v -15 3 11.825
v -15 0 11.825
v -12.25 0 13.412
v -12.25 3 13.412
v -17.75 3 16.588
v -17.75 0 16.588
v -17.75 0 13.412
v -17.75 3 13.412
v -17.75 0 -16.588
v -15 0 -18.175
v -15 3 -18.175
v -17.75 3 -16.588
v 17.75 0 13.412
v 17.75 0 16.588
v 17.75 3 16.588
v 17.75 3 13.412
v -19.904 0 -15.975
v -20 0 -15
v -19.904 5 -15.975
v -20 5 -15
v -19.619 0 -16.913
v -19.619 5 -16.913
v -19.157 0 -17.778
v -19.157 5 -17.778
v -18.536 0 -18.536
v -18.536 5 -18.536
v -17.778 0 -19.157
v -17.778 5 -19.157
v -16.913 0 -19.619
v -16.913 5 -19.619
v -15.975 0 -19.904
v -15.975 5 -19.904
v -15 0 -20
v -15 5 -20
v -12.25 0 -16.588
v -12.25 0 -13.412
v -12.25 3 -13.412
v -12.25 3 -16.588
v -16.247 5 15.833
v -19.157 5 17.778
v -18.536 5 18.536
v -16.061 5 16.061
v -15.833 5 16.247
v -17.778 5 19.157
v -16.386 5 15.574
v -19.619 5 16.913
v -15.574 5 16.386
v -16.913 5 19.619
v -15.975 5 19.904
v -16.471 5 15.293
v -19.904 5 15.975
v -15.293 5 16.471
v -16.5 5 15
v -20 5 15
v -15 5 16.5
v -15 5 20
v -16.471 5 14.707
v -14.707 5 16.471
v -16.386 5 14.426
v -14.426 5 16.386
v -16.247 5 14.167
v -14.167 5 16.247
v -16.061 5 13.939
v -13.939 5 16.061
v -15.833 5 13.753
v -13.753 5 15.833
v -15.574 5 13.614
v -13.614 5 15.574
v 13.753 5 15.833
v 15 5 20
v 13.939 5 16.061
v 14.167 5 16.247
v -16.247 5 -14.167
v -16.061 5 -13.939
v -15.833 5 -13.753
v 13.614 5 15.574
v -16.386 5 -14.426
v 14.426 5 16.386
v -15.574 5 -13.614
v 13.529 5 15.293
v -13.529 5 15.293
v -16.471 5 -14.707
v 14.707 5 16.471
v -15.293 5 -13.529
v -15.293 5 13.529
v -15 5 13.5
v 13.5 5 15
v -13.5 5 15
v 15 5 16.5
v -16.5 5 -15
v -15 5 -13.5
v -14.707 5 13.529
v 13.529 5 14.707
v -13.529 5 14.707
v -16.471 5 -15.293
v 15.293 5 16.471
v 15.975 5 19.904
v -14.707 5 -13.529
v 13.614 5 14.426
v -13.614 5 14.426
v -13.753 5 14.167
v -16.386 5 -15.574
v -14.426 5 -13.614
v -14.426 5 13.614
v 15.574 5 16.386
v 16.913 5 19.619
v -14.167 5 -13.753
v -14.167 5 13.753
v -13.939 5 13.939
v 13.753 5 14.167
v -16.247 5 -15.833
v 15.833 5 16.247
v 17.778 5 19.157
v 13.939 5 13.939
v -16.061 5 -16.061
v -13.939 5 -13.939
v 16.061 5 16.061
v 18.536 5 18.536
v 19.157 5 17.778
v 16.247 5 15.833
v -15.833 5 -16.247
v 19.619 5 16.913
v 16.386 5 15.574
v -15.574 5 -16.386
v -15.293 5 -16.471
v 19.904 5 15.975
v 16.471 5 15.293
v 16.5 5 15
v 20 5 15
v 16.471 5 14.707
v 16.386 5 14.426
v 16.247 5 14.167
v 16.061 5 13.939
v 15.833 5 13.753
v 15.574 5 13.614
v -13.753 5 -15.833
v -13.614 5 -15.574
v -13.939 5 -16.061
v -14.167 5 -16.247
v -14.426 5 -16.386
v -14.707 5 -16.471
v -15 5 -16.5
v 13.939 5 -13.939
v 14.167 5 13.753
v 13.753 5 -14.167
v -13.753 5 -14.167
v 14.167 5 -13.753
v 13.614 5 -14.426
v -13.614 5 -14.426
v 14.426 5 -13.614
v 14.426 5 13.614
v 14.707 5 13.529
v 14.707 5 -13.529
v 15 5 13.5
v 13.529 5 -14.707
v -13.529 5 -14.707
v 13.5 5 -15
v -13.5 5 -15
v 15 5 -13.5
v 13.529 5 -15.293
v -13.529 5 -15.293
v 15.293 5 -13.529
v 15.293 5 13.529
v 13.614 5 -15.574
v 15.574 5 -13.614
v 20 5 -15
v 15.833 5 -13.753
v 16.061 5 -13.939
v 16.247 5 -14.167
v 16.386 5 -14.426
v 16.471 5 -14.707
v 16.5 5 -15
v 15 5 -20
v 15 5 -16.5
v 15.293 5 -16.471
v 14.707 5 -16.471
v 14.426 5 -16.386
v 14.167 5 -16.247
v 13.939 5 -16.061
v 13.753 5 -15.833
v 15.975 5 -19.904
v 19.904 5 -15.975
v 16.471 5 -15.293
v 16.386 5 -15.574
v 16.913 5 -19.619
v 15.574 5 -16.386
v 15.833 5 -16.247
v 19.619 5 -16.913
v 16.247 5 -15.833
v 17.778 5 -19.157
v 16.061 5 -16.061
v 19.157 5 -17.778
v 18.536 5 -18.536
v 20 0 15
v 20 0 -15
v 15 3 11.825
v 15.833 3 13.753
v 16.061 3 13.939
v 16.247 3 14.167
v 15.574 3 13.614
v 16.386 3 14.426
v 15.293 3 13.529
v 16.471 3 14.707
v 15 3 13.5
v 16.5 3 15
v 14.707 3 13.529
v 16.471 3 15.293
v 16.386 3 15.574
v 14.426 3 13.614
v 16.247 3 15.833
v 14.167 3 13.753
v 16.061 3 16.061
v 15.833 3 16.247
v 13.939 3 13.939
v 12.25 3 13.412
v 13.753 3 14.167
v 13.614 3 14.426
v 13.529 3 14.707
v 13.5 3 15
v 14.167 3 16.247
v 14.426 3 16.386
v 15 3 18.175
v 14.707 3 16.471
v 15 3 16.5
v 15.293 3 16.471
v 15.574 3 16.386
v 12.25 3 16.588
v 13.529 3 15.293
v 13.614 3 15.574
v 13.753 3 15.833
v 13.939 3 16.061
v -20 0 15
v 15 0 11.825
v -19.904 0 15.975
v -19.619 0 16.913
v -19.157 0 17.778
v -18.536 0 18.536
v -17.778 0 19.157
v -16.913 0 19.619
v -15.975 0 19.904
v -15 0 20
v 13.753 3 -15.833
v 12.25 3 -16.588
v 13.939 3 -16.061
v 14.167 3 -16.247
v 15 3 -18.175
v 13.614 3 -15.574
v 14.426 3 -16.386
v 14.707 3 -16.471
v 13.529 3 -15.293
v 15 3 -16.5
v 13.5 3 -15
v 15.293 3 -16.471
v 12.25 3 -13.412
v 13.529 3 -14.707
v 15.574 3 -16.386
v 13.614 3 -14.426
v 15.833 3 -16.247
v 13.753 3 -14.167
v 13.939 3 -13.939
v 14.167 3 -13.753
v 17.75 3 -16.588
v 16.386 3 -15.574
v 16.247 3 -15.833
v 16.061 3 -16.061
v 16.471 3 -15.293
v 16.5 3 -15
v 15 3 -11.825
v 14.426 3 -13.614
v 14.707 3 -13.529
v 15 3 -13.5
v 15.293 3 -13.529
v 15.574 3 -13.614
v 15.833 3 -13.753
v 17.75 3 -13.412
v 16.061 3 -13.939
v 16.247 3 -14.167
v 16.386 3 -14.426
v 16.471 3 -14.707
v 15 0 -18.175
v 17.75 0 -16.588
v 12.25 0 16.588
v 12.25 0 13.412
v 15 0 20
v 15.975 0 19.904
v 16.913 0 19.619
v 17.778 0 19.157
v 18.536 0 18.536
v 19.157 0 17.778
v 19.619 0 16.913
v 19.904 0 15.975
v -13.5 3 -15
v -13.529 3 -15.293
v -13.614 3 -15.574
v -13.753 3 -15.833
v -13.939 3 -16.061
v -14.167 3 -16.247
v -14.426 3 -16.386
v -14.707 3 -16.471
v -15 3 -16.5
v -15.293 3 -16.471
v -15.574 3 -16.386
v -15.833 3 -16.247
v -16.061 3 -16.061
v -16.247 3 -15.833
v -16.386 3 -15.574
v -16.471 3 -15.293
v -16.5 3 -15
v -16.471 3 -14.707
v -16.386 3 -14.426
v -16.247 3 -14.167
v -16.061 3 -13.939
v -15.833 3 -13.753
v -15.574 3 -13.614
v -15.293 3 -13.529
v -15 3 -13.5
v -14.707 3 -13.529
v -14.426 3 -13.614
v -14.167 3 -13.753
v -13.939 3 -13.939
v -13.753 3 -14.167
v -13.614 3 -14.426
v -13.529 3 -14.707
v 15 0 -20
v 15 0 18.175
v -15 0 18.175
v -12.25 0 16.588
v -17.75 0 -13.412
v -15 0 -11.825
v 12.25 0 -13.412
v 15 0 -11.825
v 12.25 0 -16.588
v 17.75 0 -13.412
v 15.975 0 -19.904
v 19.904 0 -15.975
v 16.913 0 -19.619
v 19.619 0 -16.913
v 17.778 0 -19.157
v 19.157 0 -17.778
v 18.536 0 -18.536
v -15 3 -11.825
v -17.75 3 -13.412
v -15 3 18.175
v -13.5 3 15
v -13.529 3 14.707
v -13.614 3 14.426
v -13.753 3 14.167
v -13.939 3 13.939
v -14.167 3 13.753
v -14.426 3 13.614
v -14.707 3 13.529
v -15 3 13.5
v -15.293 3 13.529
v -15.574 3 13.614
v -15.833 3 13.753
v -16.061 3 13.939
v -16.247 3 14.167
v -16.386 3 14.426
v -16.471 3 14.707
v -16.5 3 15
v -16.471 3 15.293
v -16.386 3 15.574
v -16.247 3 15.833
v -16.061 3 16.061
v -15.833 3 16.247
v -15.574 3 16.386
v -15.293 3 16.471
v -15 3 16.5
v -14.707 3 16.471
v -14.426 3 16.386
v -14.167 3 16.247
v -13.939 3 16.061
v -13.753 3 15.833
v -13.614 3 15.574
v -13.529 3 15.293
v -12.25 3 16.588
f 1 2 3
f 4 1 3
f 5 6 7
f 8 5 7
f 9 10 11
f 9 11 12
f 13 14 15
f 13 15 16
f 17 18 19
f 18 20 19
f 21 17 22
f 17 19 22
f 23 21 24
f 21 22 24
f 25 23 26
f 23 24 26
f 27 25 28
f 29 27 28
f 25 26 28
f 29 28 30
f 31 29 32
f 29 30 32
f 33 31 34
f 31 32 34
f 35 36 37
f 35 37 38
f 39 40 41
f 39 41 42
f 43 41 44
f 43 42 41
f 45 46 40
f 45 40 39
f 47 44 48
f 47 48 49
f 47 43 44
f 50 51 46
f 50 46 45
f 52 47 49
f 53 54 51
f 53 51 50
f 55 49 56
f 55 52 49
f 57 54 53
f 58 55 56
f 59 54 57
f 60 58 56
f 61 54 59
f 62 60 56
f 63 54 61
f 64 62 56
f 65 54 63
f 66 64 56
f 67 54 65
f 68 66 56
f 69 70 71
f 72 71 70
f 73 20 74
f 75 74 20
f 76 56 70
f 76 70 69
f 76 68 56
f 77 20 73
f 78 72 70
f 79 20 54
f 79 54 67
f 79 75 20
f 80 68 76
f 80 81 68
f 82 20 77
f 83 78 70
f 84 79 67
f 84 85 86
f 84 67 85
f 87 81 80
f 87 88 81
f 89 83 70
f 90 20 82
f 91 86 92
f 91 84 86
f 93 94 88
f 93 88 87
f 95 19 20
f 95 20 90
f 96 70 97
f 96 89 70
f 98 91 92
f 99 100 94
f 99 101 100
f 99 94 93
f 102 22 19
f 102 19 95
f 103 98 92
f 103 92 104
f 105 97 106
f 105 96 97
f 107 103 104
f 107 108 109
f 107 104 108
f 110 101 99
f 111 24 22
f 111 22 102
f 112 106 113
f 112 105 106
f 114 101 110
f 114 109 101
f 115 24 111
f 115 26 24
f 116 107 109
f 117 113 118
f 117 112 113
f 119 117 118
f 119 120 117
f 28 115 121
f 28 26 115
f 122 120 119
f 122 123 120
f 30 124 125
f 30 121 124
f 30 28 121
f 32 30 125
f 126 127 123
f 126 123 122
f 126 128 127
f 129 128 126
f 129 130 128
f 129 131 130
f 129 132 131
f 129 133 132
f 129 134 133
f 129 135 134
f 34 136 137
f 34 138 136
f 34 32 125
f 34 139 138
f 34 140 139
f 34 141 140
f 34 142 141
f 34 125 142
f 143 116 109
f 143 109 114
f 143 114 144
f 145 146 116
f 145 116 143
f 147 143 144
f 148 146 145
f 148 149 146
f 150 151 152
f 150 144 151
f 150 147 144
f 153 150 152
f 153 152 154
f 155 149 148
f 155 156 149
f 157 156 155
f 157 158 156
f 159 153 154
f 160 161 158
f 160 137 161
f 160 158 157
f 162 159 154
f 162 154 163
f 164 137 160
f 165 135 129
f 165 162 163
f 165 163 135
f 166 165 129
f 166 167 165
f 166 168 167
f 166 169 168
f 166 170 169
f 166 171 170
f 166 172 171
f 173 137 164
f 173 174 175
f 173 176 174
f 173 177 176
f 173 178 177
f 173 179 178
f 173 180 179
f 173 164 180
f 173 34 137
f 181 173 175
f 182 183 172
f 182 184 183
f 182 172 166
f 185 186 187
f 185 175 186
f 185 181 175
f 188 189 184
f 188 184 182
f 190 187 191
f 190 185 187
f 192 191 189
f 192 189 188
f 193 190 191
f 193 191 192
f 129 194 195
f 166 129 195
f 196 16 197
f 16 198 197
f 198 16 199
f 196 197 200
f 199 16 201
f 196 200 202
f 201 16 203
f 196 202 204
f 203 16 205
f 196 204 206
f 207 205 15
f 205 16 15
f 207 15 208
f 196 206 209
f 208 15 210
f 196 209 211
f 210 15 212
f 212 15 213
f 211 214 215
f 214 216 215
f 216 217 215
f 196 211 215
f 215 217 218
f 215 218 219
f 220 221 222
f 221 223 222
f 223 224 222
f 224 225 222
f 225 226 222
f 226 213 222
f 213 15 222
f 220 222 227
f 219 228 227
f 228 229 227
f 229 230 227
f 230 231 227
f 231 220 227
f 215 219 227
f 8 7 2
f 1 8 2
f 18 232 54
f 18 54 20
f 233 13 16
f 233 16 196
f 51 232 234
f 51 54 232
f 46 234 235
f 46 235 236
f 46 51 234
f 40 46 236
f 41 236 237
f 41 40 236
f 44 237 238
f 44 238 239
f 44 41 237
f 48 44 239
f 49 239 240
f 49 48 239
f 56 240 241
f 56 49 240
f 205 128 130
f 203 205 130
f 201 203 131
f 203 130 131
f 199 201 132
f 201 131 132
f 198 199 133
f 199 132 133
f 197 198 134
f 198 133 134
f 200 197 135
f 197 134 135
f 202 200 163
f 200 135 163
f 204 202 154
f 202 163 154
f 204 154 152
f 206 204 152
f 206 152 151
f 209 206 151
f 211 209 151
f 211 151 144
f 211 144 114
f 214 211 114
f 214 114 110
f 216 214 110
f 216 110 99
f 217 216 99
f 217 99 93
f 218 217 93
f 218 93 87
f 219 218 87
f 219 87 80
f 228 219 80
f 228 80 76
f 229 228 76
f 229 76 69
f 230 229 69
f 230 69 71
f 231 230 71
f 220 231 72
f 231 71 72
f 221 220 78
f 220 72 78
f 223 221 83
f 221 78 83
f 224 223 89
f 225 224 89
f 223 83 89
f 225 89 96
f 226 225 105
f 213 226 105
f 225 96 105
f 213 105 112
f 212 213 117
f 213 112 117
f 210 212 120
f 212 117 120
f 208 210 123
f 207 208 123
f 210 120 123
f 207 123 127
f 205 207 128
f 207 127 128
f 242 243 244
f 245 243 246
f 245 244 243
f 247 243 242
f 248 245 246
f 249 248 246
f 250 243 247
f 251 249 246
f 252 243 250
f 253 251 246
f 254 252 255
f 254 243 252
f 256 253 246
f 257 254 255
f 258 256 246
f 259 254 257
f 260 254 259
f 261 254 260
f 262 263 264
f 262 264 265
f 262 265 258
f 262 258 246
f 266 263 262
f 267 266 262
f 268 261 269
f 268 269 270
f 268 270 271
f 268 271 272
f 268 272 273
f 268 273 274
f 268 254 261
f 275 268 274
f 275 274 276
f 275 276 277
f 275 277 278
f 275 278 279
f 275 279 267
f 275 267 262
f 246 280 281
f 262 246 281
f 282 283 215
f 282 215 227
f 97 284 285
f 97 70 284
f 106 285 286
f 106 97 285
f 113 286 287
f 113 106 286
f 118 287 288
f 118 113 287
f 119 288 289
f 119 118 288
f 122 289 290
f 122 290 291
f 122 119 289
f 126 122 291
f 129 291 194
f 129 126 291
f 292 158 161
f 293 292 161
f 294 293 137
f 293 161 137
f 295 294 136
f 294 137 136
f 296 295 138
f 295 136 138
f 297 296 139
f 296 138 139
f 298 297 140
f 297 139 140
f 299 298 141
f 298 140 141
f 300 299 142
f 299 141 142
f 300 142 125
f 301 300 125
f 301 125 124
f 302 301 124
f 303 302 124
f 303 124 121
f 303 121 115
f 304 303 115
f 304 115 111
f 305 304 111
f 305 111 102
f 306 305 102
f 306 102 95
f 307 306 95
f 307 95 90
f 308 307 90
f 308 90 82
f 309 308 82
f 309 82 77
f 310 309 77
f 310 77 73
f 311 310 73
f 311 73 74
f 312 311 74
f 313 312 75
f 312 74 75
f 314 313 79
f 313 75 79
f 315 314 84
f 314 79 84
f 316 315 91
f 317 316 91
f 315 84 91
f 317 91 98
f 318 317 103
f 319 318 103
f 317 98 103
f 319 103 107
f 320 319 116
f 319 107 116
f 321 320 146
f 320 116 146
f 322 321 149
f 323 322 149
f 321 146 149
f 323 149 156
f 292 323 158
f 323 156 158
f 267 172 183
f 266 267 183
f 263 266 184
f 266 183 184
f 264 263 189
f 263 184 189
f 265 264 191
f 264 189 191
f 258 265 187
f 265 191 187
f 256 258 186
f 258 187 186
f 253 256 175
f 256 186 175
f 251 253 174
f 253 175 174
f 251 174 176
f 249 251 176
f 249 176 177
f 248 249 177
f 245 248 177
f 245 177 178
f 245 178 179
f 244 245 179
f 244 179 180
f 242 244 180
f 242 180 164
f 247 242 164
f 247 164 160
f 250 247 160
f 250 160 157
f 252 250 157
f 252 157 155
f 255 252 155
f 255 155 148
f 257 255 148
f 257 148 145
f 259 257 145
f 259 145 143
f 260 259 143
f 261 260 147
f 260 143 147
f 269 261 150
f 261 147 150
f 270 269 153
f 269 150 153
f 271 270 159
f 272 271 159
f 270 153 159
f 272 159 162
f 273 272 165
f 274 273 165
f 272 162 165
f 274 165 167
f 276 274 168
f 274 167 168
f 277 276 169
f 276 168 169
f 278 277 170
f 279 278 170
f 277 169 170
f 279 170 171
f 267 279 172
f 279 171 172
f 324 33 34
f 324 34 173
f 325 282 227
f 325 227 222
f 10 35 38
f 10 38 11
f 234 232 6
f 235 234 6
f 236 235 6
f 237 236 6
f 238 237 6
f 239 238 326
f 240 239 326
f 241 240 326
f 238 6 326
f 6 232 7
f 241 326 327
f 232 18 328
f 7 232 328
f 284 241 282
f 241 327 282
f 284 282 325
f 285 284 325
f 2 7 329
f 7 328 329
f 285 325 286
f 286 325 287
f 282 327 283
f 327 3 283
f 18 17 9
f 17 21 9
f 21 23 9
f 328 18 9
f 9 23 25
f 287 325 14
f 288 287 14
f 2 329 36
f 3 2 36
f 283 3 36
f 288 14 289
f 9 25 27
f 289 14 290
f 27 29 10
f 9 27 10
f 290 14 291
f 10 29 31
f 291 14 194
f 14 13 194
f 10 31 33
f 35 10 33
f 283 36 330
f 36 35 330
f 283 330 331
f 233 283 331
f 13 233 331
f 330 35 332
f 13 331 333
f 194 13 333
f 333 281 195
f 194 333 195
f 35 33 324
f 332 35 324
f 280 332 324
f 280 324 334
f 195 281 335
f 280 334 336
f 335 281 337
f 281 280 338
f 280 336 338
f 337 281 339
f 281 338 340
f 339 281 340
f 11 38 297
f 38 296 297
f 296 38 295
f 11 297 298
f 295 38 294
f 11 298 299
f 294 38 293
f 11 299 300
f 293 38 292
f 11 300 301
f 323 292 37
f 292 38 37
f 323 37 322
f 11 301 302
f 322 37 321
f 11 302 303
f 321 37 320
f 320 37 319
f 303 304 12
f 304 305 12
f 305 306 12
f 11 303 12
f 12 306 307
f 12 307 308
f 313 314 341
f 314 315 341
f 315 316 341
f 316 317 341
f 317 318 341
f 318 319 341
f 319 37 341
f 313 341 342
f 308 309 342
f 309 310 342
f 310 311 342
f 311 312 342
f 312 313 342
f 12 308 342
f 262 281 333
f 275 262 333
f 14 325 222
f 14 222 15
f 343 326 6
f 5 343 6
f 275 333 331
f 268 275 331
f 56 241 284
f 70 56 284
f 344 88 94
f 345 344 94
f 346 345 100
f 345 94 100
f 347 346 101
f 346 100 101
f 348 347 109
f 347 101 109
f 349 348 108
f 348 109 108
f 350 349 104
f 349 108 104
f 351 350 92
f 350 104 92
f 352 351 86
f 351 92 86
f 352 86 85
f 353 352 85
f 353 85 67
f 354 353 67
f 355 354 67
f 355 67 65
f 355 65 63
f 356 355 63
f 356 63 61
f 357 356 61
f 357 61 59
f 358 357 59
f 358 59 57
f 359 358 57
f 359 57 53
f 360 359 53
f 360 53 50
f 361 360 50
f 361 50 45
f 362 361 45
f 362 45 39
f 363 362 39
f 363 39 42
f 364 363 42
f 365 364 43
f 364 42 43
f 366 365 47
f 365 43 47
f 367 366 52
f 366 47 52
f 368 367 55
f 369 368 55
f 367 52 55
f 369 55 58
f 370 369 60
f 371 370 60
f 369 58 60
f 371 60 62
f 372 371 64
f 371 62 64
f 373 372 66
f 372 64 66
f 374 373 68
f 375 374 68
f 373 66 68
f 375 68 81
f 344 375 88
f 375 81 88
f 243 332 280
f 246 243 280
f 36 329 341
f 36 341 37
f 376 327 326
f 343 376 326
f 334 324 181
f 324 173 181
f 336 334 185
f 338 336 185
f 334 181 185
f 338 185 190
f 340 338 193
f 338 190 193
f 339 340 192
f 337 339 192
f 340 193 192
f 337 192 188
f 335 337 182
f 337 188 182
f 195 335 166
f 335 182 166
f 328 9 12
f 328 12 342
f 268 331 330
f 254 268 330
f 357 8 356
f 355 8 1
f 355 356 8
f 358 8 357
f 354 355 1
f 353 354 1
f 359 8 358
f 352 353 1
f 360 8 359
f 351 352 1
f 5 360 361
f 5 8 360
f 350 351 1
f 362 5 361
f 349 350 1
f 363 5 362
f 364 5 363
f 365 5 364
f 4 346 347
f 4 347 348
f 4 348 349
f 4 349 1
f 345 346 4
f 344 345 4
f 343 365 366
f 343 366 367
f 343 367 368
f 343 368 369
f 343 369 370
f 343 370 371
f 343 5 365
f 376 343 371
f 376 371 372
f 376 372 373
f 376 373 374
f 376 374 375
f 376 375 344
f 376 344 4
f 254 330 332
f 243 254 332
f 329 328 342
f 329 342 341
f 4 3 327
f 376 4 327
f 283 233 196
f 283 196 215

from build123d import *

# Parameters (mm, degrees)
SKETCH_1_W          = 40
SKETCH_1_H          = 40
EXTRUDE_1_DEPTH     = 5
SKETCH_2_R          = 1.5
CUT_EXTRUDE_1_DEPTH = 10
FILLET_1_R          = 5
CUT_EXTRUDE_3_DEPTH = 3


with BuildPart() as part:
    # 草图1 → 凸台-拉伸1 (new body)
    with BuildSketch(Plane(origin=(0, 0, 0), x_dir=(1, 0, 0), z_dir=(0, 1, 0))):
        Rectangle(SKETCH_1_W, SKETCH_1_H)
    extrude(amount=EXTRUDE_1_DEPTH)

    # 草图2 → 切除-拉伸1 (cut)
    with BuildSketch(Plane(origin=(0, 5, 0), x_dir=(1, 0, 0), z_dir=(0, 1, 0))):
        with Locations((-15, 15)):
            Circle(SKETCH_2_R)
        with Locations((15, 15)):
            Circle(SKETCH_2_R)
        with Locations((15, -15)):
            Circle(SKETCH_2_R)
        with Locations((-15, -15)):
            Circle(SKETCH_2_R)
    extrude(amount=-CUT_EXTRUDE_1_DEPTH, mode=Mode.SUBTRACT)

    # 圆角1
    fillet_1_edges = [part.edges().sort_by_distance(p)[0] for p in [
        (20, 2.5, 20),
        (-20, 2.5, 20),
        (-20, 2.5, -20),
        (20, 2.5, -20),
    ]]
    fillet(fillet_1_edges, radius=FILLET_1_R)

    # 草图4 → 切除-拉伸3 (cut)
    with BuildSketch(Plane.XZ):
        Polygon((12.25, 16.58771324), (15, 18.175426481), (17.75, 16.58771324), (17.75, 13.41228676), (15, 11.824573519), (12.25, 13.41228676), align=None)
        Polygon((-15, 18.175426481), (-17.75, 16.58771324), (-17.75, 13.41228676), (-15, 11.824573519), (-12.25, 13.41228676), (-12.25, 16.58771324), align=None)
        Polygon((12.25, -13.41228676), (12.25, -16.58771324), (15, -18.175426481), (17.75, -16.58771324), (17.75, -13.41228676), (15, -11.824573519), align=None)
        Polygon((-12.25, -16.58771324), (-15, -18.175426481), (-17.75, -16.58771324), (-17.75, -13.41228676), (-15, -11.824573519), (-12.25, -13.41228676), align=None)
    extrude(amount=-CUT_EXTRUDE_3_DEPTH, mode=Mode.SUBTRACT)


solid = part.part
